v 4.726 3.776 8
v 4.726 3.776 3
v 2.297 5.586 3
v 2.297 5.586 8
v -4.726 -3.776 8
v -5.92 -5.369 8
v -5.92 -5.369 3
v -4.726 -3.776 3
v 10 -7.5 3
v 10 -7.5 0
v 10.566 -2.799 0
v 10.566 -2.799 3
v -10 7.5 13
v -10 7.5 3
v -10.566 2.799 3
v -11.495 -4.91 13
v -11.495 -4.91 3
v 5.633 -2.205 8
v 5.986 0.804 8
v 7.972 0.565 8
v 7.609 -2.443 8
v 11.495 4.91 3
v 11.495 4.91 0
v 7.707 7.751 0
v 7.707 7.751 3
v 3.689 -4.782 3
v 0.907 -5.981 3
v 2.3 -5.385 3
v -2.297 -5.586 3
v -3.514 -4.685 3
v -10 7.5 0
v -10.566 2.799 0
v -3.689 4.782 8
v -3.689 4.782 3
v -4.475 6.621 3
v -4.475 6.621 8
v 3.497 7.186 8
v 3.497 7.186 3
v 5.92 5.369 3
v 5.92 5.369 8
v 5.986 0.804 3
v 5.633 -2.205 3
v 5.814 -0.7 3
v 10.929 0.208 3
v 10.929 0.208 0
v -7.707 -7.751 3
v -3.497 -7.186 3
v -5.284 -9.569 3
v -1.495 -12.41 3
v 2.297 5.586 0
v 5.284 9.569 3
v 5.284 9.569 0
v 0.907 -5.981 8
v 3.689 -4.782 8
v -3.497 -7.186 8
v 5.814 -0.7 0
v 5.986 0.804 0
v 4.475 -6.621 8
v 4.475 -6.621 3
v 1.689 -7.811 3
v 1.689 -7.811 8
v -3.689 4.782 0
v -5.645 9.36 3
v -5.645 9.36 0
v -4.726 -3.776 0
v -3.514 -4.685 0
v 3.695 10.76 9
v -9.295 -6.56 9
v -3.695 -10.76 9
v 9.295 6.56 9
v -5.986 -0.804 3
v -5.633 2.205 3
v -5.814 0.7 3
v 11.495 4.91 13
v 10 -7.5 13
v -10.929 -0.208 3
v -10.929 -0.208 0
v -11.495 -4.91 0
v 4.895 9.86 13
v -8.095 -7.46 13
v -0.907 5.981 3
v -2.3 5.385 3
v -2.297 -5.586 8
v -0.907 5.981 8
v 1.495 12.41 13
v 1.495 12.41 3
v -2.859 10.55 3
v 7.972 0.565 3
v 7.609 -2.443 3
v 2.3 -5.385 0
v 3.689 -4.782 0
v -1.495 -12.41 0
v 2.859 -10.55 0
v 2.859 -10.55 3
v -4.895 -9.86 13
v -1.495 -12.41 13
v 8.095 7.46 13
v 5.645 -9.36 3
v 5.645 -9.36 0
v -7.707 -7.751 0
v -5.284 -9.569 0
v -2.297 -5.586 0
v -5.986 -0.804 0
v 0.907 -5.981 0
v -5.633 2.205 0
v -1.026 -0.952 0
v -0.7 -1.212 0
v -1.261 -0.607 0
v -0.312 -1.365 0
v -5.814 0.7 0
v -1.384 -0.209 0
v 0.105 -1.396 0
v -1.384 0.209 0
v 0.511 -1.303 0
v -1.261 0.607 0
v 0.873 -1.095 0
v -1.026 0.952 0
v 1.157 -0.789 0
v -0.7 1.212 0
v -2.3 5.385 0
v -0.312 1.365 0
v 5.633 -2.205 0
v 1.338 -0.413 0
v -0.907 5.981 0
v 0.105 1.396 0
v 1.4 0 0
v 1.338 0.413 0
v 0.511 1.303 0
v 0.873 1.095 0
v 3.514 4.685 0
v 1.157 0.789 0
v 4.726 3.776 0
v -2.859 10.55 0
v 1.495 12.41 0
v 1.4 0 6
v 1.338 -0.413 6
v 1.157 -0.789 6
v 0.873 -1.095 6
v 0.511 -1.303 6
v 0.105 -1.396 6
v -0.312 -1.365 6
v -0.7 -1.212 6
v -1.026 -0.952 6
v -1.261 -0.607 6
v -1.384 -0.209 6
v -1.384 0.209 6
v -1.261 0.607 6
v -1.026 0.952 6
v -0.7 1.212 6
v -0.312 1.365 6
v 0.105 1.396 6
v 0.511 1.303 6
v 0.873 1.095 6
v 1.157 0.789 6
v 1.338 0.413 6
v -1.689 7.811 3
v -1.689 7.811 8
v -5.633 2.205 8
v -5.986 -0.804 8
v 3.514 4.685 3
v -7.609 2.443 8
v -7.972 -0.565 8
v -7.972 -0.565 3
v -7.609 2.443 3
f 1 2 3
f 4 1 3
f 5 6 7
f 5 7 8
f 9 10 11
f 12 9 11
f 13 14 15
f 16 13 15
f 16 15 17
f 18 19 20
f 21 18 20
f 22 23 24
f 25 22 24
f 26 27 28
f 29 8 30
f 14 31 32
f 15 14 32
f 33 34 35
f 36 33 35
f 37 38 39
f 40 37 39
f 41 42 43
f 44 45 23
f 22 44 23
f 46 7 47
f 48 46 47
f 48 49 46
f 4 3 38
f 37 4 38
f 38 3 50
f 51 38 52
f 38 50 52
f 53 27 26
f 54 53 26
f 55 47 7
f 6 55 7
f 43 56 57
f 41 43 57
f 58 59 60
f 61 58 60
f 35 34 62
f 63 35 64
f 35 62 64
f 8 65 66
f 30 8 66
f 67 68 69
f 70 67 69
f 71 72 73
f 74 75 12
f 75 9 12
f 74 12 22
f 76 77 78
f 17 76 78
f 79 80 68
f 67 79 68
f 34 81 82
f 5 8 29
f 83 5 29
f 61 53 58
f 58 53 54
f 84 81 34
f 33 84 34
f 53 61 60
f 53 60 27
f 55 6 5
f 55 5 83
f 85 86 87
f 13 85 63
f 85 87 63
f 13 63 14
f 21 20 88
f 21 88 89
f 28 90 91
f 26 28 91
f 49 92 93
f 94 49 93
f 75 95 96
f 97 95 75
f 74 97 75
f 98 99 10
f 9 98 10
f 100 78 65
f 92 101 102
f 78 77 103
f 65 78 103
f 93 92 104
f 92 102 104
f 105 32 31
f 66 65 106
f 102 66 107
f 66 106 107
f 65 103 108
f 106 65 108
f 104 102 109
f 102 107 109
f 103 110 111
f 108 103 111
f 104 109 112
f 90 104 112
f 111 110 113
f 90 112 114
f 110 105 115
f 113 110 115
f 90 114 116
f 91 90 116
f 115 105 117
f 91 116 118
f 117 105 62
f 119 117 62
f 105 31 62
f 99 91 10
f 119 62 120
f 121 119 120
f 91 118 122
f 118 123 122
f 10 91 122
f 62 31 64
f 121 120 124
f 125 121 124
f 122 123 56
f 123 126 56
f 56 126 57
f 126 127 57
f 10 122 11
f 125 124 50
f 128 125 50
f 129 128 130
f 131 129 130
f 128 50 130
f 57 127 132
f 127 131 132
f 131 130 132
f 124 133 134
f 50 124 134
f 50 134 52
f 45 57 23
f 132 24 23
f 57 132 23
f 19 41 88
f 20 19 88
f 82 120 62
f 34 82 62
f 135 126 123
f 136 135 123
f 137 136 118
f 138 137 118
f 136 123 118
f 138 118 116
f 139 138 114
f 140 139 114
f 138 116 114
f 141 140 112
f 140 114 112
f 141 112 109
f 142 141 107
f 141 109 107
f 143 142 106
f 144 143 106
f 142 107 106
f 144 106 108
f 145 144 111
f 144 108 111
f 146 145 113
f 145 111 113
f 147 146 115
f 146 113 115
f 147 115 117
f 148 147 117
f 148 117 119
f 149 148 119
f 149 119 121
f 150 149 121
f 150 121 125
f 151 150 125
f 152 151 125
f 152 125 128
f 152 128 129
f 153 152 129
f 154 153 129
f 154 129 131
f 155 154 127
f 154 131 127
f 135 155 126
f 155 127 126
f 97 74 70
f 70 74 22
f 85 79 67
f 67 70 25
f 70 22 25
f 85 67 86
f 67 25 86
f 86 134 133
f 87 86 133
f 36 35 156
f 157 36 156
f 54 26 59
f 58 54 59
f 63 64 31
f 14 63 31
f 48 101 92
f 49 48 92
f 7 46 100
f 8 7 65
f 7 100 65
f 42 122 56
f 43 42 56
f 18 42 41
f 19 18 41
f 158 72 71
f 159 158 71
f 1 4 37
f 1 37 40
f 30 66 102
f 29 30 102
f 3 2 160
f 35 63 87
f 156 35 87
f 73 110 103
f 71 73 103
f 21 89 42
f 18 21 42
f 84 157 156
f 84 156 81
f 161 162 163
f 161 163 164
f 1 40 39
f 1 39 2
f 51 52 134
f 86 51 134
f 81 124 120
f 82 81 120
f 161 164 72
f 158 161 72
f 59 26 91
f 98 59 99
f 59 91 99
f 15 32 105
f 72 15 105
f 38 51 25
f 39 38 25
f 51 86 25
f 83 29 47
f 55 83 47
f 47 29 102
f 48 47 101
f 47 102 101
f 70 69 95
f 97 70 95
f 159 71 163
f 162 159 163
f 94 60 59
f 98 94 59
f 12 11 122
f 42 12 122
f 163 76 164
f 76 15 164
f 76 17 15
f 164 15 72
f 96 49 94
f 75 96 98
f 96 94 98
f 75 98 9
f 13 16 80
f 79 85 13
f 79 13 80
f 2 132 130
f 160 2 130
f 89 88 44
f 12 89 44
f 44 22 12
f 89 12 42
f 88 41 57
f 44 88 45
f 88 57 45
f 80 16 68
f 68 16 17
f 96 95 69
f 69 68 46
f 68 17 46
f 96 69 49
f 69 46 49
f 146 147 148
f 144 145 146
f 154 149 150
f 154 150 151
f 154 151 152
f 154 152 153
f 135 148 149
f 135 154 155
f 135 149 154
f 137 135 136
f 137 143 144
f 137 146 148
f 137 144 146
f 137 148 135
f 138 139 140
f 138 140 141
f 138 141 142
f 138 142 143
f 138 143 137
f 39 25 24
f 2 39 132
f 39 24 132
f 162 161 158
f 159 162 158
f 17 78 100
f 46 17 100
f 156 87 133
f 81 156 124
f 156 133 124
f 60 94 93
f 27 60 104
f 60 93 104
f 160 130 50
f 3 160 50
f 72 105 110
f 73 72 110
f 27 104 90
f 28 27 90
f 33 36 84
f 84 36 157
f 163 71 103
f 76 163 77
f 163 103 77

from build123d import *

# Parameters (mm, degrees)
F1_DEPTH = 3
F3_DEPTH = 5
F5_DEPTH = 5
F7_DEPTH = 27.651635
F8_R     = 1.4
F9_DEPTH = 6


with BuildPart() as f1:
    # F0 (on Top) → F1 (new body)
    with BuildSketch(Plane.XY):
        Polygon((5.283907, 9.568716), (1.495191, 12.410254), (-2.859099, 10.550288), (-0.90712, 5.980591), (-2.300426, 5.38543), (-3.689196, 4.782179), (-5.644798, 9.360356), (-10, 7.5), (-10.566367, 2.799092), (-5.632904, 2.204707), (-5.814132, 0.700488), (-5.986087, -0.803848), (-10.928705, -0.20836), (-11.495191, -4.910254), (-7.707268, -7.751196), (-4.725784, -3.775884), (-3.513707, -4.684942), (-2.296891, -5.586028), (-5.283907, -9.568716), (-1.495191, -12.410254), (2.859099, -10.550288), (0.90712, -5.980591), (2.300426, -5.38543), (3.689196, -4.782179), (5.644798, -9.360356), (10, -7.5), (10.566367, -2.799092), (5.632904, -2.204707), (5.814132, -0.700488), (5.986087, 0.803848), (10.928705, 0.20836), (11.495191, 4.910254), (7.707268, 7.751196), (4.725784, 3.775884), (3.513707, 4.684942), (2.296891, 5.586028), align=None)
    extrude(amount=F1_DEPTH)

    # F2 (on face) → F3 (join)
    with BuildSketch(Plane.XY.offset(3)):
        Polygon((-10, 7.5), (-11.495191, -4.910254), (-1.495191, -12.410254), (10, -7.5), (11.495191, 4.910254), (1.495191, 12.410254), align=None)
        Polygon((-2.296891, -5.586028), (-3.496891, -7.186028), (-5.920251, -5.368507), (-4.725784, -3.775884), align=None, mode=Mode.SUBTRACT)
        Polygon((3.689196, -4.782179), (4.474837, -6.62141), (1.689138, -7.811341), (0.90712, -5.980591), align=None, mode=Mode.SUBTRACT)
        Polygon((5.986087, 0.803848), (7.971728, 0.564618), (7.609389, -2.442834), (5.632904, -2.204707), align=None, mode=Mode.SUBTRACT)
        Polygon((-5.986087, -0.803848), (-7.971728, -0.564618), (-7.609389, 2.442834), (-5.632904, 2.204707), align=None, mode=Mode.SUBTRACT)
        Polygon((-3.689196, 4.782179), (-4.474837, 6.62141), (-1.689138, 7.811341), (-0.90712, 5.980591), align=None, mode=Mode.SUBTRACT)
        Polygon((2.296891, 5.586028), (3.496891, 7.186028), (5.920251, 5.368507), (4.725784, 3.775884), align=None, mode=Mode.SUBTRACT)
    extrude(amount=F3_DEPTH)

    # F4 (on face) → F5 (join)
    with BuildSketch(Plane.XY.offset(8)):
        Polygon((-11.495191, -4.910254), (-1.495191, -12.410254), (10, -7.5), (11.495191, 4.910254), (1.495191, 12.410254), (-10, 7.5), align=None)
    extrude(amount=F5_DEPTH)

    # F6 (on face) → F7 (cut, through all)
    with BuildSketch(Plane(origin=(-6.495191, -8.660254, 0), x_dir=(0.8, -0.6, 0), z_dir=(-0.6, -0.8, 0))):
        Polygon((-3.5, 9), (3.5, 9), (2, 13), (-2, 13), align=None)
    extrude(amount=-F7_DEPTH, mode=Mode.SUBTRACT)

    # F8 (on face) → F9 (cut)
    with BuildSketch(Plane(origin=(0, 0, 0), x_dir=(1, 0, 0), z_dir=(0, 0, -1))):
        Circle(F8_R)
    extrude(amount=-F9_DEPTH, mode=Mode.SUBTRACT)


solid = f1.part
